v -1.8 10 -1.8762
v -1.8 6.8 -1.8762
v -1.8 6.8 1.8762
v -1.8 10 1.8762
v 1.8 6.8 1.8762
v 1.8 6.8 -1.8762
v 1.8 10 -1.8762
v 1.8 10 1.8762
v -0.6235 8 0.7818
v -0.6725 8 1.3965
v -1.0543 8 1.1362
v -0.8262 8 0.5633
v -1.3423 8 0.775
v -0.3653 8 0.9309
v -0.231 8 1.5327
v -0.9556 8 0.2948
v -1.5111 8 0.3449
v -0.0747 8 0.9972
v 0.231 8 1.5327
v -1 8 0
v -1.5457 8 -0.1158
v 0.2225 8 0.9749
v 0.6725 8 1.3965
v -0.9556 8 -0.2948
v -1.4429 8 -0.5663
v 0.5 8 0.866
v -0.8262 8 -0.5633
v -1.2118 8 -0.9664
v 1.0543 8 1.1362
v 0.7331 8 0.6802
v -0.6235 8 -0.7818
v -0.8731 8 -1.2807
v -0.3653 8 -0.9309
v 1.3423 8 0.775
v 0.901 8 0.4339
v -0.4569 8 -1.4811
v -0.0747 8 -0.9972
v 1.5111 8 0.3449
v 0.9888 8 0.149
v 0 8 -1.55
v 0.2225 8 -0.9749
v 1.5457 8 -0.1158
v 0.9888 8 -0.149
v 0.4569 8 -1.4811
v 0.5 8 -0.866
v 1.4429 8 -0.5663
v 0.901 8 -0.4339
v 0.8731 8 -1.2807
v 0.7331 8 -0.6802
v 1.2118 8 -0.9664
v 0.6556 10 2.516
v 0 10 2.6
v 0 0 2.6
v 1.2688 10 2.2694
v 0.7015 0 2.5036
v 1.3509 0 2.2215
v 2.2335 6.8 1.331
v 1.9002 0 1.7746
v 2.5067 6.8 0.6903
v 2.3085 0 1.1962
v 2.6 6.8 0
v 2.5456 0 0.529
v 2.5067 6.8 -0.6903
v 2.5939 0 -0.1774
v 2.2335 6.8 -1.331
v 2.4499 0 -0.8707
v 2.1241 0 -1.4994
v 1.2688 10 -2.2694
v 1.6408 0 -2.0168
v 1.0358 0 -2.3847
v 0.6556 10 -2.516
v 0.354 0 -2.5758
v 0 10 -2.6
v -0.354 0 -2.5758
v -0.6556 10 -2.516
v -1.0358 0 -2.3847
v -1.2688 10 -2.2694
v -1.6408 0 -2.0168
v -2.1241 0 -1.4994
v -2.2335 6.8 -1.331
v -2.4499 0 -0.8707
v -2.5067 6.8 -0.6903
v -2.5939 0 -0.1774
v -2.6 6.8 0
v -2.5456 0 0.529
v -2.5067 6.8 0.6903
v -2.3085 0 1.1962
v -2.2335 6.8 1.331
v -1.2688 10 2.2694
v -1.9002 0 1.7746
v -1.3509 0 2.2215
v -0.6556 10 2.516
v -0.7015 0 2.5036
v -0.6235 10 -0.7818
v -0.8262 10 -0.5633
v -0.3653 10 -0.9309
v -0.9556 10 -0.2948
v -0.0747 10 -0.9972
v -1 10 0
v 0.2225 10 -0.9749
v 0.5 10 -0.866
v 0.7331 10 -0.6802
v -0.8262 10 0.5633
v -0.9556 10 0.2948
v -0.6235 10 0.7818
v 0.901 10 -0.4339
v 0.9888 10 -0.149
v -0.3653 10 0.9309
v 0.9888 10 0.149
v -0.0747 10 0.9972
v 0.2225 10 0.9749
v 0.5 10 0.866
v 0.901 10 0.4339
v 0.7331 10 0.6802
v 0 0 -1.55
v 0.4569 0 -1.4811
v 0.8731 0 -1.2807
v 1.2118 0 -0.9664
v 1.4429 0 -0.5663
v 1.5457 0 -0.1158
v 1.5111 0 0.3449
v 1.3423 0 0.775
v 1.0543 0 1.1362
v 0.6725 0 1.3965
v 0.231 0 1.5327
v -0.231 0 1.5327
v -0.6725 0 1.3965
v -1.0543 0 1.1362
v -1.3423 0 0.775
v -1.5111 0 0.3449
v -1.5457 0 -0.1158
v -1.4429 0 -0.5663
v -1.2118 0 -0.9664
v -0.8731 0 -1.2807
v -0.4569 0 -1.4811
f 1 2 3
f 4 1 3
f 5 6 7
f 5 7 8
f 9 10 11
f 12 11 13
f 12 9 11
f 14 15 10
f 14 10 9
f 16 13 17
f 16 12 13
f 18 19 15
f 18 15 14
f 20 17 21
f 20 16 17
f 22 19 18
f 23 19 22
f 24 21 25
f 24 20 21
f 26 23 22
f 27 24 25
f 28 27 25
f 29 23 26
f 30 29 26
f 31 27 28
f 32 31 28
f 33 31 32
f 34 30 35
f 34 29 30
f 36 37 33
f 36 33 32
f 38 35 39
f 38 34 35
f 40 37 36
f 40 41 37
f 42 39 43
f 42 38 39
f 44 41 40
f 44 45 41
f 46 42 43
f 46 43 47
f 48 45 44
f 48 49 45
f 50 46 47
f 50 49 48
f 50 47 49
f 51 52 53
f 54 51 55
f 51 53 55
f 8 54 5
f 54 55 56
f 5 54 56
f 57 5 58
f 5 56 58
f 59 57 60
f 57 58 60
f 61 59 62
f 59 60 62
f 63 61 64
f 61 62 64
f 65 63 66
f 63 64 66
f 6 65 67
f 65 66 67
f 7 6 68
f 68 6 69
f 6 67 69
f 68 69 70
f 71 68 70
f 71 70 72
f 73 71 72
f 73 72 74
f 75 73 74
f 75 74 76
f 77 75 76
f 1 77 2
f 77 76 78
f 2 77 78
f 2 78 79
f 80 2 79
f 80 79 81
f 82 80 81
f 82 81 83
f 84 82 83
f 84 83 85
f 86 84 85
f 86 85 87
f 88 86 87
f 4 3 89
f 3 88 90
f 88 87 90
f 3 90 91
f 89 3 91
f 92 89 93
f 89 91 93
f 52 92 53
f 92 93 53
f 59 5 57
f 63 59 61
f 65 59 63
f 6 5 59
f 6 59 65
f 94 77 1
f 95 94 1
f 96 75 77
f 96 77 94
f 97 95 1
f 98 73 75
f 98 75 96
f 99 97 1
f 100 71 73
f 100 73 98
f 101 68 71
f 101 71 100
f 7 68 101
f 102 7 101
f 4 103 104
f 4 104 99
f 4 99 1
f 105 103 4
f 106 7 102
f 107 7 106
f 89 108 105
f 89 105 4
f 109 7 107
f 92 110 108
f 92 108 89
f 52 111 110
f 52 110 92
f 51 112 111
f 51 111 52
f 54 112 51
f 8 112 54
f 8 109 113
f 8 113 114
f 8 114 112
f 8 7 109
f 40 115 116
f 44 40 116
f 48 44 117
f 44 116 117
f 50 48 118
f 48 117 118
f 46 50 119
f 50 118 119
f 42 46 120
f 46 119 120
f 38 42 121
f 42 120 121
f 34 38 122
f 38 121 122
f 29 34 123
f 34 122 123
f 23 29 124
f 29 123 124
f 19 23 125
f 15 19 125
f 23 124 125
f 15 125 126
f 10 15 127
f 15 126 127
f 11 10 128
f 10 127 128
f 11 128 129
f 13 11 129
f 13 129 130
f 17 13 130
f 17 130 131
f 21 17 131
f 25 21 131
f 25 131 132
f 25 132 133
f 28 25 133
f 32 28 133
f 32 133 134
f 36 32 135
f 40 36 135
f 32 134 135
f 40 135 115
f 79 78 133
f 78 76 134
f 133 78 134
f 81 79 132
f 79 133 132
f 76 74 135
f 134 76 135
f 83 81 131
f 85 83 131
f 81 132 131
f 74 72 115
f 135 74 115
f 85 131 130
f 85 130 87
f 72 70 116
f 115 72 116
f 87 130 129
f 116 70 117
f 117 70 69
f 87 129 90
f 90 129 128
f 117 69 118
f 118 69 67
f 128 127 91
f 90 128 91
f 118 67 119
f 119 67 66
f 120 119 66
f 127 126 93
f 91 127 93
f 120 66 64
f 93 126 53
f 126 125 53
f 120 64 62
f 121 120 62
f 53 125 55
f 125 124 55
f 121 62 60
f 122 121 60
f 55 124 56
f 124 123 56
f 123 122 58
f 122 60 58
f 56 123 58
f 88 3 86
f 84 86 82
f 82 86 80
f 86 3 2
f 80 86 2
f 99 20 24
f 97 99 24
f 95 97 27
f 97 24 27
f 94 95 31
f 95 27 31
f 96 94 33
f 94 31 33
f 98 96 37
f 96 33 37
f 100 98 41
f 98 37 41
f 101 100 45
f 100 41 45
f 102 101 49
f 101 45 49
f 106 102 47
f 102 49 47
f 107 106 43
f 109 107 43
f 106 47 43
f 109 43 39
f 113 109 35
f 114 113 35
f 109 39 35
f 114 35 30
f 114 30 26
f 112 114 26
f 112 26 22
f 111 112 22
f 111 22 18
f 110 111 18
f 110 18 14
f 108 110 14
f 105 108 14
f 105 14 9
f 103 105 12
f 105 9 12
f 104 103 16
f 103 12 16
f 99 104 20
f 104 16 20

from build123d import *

# Parameters (mm, degrees)
SKETCH1_R                 = 2.6
BOSS_EXTRUDE1_DEPTH       = 10
CUT_EXTRUDE1_START        = -3.2
CUT_EXTRUDE1_DEPTH        = 3.2
F_1_0MM_DOWEL_HOLE1_D     = 2
F_1_0MM_DOWEL_HOLE1_DEPTH = 3.399139381
F_1_0MM_DOWEL_HOLE1_TIP   = 0.600860619
SKETCH5_R                 = 1.55
CUT_EXTRUDE2_DEPTH        = 8


with BuildPart() as part:
    # Sketch1 → Boss-Extrude1 (new body)
    with BuildSketch(Plane(origin=(0, 0, 0), x_dir=(1, 0, 0), z_dir=(0, 1, 0))):
        Circle(SKETCH1_R)
    extrude(amount=BOSS_EXTRUDE1_DEPTH)

    # Sketch2 → Cut-Extrude1 (cut)
    with BuildSketch(Plane(origin=(0, 10, 0), x_dir=(1, 0, 0), z_dir=(0, 1, 0)).offset(CUT_EXTRUDE1_START)):
        with BuildLine():
            Line((-1.8, 1.876166304), (-1.8, -1.876166304))
            ThreePointArc((-1.8, -1.876166304), (-2.6, 0), (-1.8, 1.876166304))
        make_face()
        with BuildLine():
            Line((1.8, 1.876166304), (1.8, -1.876166304))
            ThreePointArc((1.8, -1.876166304), (2.6, 0), (1.8, 1.876166304))
        make_face()
    extrude(amount=CUT_EXTRUDE1_DEPTH, mode=Mode.SUBTRACT)

    # Ø1.0mm Dowel Hole1
    with Locations(Plane(origin=(0, 10, 0), x_dir=(1, 0, 0), z_dir=(0, 1, 0))):
        with Locations((0, 0)):
            Hole(F_1_0MM_DOWEL_HOLE1_D / 2, depth=F_1_0MM_DOWEL_HOLE1_DEPTH)
            with Locations((0, 0, -(F_1_0MM_DOWEL_HOLE1_DEPTH + F_1_0MM_DOWEL_HOLE1_TIP / 2))):  # 118° drill point
                Cone(0, F_1_0MM_DOWEL_HOLE1_D / 2, F_1_0MM_DOWEL_HOLE1_TIP, mode=Mode.SUBTRACT)

    # Sketch5 → Cut-Extrude2 (cut)
    with BuildSketch(Plane.XZ):
        Circle(SKETCH5_R)
    extrude(amount=-CUT_EXTRUDE2_DEPTH, mode=Mode.SUBTRACT)


solid = part.part
